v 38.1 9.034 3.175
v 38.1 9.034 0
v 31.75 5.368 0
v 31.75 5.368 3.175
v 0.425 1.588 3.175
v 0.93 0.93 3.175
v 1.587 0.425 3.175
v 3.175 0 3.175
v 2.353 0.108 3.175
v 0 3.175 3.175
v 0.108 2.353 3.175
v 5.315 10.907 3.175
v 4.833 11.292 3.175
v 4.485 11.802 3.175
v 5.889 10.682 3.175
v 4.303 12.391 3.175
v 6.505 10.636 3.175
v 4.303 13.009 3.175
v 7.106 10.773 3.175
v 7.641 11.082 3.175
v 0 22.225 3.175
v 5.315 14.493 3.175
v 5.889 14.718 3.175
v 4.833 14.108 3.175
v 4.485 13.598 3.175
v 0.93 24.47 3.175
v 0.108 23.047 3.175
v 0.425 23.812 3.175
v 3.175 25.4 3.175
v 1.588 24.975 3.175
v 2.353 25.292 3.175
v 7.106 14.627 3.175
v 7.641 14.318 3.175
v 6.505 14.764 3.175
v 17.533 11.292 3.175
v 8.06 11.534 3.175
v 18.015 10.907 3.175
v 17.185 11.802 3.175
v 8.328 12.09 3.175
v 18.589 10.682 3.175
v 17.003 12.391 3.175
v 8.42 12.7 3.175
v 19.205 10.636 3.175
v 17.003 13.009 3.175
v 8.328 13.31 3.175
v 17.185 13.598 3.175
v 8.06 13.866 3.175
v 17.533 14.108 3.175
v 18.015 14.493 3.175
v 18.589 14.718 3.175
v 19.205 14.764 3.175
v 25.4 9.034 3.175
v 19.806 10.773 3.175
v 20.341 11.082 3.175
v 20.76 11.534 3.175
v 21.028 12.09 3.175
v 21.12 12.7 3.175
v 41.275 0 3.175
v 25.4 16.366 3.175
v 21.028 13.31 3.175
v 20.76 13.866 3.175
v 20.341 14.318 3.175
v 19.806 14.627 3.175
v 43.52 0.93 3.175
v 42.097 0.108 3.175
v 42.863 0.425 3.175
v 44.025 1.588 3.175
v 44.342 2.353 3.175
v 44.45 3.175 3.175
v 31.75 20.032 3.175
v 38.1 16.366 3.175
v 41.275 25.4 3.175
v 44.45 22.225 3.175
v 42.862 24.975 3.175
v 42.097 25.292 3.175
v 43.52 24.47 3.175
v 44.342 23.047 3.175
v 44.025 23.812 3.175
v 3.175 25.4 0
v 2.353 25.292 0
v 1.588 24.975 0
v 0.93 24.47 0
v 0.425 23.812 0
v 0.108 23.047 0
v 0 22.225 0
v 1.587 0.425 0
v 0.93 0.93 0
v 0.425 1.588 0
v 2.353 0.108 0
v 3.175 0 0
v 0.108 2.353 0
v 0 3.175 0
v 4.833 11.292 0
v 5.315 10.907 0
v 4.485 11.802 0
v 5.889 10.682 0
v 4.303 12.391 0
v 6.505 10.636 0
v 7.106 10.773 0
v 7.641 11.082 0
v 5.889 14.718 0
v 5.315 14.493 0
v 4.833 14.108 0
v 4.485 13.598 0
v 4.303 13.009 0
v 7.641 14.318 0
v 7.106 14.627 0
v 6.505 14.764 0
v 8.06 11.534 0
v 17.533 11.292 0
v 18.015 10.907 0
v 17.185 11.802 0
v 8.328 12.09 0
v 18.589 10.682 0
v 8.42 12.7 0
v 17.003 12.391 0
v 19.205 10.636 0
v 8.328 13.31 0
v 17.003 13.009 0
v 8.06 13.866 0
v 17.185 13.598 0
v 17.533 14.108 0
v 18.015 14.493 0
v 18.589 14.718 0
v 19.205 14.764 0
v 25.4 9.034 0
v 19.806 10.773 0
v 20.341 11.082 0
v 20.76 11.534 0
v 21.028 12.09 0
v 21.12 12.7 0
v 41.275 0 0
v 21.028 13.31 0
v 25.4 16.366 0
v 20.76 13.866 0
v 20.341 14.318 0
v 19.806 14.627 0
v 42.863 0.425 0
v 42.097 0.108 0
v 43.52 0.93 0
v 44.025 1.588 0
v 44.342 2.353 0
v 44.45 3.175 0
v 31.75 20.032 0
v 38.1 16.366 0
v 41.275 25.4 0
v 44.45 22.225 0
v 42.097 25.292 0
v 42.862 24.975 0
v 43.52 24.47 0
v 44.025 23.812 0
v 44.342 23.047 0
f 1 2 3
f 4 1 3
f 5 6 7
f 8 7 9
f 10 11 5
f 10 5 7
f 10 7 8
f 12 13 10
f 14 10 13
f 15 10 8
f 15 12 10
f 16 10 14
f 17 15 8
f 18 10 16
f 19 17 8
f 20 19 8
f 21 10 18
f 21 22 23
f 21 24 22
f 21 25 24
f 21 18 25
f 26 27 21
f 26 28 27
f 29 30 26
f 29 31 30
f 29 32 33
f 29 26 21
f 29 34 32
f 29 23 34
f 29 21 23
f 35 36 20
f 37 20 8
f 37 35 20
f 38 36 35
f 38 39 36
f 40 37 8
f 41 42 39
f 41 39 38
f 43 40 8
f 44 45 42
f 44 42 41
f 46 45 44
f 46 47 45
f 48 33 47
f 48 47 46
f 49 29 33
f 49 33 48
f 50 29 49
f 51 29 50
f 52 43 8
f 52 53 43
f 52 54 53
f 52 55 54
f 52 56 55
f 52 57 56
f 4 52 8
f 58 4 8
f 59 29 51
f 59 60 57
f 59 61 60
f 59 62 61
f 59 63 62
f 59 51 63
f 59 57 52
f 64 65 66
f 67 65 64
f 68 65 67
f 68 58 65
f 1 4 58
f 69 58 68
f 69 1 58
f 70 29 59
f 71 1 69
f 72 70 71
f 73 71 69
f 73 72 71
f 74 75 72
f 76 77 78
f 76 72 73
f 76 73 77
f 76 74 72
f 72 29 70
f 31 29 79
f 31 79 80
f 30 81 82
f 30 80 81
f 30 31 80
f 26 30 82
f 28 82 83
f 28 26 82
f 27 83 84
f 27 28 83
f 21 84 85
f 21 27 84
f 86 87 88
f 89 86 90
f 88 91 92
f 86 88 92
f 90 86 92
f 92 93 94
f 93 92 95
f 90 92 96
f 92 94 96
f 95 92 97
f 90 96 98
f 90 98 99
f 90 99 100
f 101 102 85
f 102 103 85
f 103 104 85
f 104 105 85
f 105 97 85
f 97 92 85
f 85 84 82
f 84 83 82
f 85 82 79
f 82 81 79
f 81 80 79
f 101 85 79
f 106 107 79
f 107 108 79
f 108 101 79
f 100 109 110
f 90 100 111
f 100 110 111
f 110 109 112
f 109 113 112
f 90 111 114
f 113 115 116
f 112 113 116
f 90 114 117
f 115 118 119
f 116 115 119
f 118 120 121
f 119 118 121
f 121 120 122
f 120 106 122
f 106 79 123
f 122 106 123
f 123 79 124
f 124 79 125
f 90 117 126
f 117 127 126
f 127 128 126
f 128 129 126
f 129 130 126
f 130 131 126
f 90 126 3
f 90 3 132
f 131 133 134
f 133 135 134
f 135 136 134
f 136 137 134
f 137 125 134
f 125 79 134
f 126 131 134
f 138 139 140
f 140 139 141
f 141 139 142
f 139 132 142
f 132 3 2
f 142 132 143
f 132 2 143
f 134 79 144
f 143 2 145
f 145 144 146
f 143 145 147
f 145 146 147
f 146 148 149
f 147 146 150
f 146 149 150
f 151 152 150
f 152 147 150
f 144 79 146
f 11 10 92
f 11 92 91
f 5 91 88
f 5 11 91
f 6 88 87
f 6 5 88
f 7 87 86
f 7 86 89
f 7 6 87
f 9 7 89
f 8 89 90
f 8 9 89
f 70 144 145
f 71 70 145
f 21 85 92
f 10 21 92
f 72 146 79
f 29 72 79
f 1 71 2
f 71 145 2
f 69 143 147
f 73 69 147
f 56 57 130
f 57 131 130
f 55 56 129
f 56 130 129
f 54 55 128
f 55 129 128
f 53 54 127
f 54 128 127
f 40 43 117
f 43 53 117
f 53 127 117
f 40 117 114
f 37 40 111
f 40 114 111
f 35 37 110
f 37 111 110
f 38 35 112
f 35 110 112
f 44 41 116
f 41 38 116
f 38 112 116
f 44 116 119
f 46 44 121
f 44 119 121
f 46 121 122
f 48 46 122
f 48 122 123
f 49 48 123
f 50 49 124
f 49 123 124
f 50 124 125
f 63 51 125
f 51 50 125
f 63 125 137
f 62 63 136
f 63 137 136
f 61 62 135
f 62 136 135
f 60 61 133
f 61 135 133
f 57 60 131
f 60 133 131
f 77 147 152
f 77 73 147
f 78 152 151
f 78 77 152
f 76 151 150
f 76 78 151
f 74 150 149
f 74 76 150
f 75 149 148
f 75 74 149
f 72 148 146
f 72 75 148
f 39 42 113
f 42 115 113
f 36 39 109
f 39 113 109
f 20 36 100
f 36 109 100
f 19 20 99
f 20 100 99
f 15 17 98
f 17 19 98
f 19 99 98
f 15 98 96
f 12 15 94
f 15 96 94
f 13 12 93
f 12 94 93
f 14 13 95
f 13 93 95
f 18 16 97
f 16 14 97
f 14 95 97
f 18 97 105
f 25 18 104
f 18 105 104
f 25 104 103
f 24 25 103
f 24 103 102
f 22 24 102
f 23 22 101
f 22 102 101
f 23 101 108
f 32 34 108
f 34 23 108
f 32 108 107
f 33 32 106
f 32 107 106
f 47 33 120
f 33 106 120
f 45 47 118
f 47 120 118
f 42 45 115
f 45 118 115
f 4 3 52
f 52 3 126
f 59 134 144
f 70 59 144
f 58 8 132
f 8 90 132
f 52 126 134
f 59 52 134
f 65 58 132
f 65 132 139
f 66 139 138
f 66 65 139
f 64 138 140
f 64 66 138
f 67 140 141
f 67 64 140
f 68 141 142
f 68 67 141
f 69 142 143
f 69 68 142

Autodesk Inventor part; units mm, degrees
ref_plane "YZ Plane" through (0, 0, 0) normal (1, 0, 0) x (0, 1, 0)
ref_plane "XZ Plane" through (0, 0, 0) normal (0, 1, 0) x (-1, 0, 0)
ref_plane "XY Plane" through (0, 0, 0) normal (0, 0, 1) x (1, 0, 0)
sketch "Sketch1" plane through (0, 0, 0) normal (0, 0, 1) x (1, 0, 0)
  line L0 (0, 0) -> (44.45, 0)
  line L1 (44.45, 0) -> (44.45, 25.4)
  line L2 (44.45, 25.4) -> (0, 25.4)
  line L3 (0, 25.4) -> (0, 0)
  circle A0 centre (6.35, 12.7) radius 2.0701
  line L4 (31.75, 20.0323) -> (38.1, 16.3662)
  line L5 (38.1, 16.3662) -> (38.1, 9.0338)
  line L6 (38.1, 9.0338) -> (31.75, 5.3677)
  line L7 (31.75, 5.3677) -> (25.4, 9.0338)
  line L8 (25.4, 9.0338) -> (25.4, 16.3662)
  line L9 (25.4, 16.3662) -> (31.75, 20.0323)
  circle A1 centre (19.05, 12.7) radius 2.0701
  point P0 (31.75, 12.7)
  dimension "d0" = 44.45
  dimension "d1" = 25.4
  dimension "d2" = 4.1402
  dimension "d3" = 12.7
  dimension "d4" = 6.35
  dimension "d5" = 25.4
  dimension "d6" = 12.7
  dimension "d7" = 12.7
  dimension "d11" = 12.7
  dimension "d12" = 12.7
extrude "Extrusion1" add sketch "Sketch1" along normal blind 3.175
fillet "Fillet1" radius 3.175 4 edges at (44.45, 25.4, 1.5875) (44.45, 0, 1.5875) (0, 25.4, 1.5875) (0, 0, 1.5875)
properties part number "Hex Spacer 1-2 in (4)" material "Aluminum 6061"
